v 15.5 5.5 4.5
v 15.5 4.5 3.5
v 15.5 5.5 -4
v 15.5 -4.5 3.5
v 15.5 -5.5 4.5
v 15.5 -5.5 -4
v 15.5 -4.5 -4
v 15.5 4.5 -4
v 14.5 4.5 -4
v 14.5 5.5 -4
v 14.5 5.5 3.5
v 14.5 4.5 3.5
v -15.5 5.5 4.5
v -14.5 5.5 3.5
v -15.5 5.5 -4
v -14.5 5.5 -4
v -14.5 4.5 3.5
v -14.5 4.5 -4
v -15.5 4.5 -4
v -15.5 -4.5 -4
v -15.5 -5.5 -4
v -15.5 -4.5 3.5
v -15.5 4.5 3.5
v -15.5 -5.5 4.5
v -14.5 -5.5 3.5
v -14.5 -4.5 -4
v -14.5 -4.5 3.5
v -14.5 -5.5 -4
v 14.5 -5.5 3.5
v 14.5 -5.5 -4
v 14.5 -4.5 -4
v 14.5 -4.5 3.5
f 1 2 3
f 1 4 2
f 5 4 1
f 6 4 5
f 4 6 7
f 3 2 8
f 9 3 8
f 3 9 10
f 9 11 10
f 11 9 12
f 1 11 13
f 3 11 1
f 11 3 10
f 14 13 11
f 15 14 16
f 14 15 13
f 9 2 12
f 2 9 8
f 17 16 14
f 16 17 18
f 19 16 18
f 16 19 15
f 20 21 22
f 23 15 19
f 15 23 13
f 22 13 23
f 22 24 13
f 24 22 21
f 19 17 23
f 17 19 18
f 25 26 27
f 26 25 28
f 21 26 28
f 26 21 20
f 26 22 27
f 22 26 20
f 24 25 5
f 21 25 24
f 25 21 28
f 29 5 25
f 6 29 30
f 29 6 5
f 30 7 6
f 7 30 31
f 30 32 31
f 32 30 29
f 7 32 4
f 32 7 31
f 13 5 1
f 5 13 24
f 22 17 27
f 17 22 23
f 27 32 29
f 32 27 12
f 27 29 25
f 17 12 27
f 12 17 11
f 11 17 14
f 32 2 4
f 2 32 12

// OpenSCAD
module Table_01(){

    Table_Leg = [1,1,8];

    Leg_Distance_x = 30;
    Leg_Distance_y = 10;

    color("#cdaa7d"){
    translate([Leg_Distance_x*0.5,Leg_Distance_y*0.5,0])
    cube([Table_Leg[0],Table_Leg[1],Table_Leg[2]],center=true);

    translate([-Leg_Distance_x*0.5,Leg_Distance_y*0.5,0])
    cube([Table_Leg[0],Table_Leg[1],Table_Leg[2]],center=true);

    translate([-Leg_Distance_x*0.5,-Leg_Distance_y*0.5,0])
    cube([Table_Leg[0],Table_Leg[1],Table_Leg[2]],center=true);

    translate([Leg_Distance_x*0.5,-Leg_Distance_y*0.5,0])
    cube([Table_Leg[0],Table_Leg[1],Table_Leg[2]],center=true);

    Table_Upper = [Leg_Distance_x+Table_Leg[0],Leg_Distance_y+Table_Leg[1],1];
    Table_Height = Table_Leg[2]*0.5;

    translate([0,0,Table_Height])
    cube([Table_Upper[0],Table_Upper[1],Table_Upper[2]],center=true);
    }

}

Table_01();

// Written by Nicolì Angelo (Gengio) 2024: 
// MIT License

//Permission is hereby granted, free of charge, to any person obtaining a copy of this software and associated documentation files (the "Software"), to deal in the Software without restriction, including without limitation the rights to use, copy, modify, merge, publish, distribute, sublicense, and/or sell copies of the Software, and to permit persons to whom the Software is furnished to do so, subject to the following conditions:

//The above copyright notice and this permission notice shall be included in all copies or substantial portions of the Software.

//THE SOFTWARE IS PROVIDED "AS IS", WITHOUT WARRANTY OF ANY KIND, EXPRESS OR IMPLIED, INCLUDING BUT NOT LIMITED TO THE WARRANTIES OF MERCHANTABILITY, FITNESS FOR A PARTICULAR PURPOSE AND NONINFRINGEMENT. IN NO EVENT SHALL THE AUTHORS OR COPYRIGHT HOLDERS BE LIABLE FOR ANY CLAIM, DAMAGES OR OTHER LIABILITY, WHETHER IN AN ACTION OF CONTRACT, TORT OR OTHERWISE, ARISING FROM, OUT OF OR IN CONNECTION WITH THE SOFTWARE OR THE USE OR OTHER DEALINGS IN THE SOFTWARE.
